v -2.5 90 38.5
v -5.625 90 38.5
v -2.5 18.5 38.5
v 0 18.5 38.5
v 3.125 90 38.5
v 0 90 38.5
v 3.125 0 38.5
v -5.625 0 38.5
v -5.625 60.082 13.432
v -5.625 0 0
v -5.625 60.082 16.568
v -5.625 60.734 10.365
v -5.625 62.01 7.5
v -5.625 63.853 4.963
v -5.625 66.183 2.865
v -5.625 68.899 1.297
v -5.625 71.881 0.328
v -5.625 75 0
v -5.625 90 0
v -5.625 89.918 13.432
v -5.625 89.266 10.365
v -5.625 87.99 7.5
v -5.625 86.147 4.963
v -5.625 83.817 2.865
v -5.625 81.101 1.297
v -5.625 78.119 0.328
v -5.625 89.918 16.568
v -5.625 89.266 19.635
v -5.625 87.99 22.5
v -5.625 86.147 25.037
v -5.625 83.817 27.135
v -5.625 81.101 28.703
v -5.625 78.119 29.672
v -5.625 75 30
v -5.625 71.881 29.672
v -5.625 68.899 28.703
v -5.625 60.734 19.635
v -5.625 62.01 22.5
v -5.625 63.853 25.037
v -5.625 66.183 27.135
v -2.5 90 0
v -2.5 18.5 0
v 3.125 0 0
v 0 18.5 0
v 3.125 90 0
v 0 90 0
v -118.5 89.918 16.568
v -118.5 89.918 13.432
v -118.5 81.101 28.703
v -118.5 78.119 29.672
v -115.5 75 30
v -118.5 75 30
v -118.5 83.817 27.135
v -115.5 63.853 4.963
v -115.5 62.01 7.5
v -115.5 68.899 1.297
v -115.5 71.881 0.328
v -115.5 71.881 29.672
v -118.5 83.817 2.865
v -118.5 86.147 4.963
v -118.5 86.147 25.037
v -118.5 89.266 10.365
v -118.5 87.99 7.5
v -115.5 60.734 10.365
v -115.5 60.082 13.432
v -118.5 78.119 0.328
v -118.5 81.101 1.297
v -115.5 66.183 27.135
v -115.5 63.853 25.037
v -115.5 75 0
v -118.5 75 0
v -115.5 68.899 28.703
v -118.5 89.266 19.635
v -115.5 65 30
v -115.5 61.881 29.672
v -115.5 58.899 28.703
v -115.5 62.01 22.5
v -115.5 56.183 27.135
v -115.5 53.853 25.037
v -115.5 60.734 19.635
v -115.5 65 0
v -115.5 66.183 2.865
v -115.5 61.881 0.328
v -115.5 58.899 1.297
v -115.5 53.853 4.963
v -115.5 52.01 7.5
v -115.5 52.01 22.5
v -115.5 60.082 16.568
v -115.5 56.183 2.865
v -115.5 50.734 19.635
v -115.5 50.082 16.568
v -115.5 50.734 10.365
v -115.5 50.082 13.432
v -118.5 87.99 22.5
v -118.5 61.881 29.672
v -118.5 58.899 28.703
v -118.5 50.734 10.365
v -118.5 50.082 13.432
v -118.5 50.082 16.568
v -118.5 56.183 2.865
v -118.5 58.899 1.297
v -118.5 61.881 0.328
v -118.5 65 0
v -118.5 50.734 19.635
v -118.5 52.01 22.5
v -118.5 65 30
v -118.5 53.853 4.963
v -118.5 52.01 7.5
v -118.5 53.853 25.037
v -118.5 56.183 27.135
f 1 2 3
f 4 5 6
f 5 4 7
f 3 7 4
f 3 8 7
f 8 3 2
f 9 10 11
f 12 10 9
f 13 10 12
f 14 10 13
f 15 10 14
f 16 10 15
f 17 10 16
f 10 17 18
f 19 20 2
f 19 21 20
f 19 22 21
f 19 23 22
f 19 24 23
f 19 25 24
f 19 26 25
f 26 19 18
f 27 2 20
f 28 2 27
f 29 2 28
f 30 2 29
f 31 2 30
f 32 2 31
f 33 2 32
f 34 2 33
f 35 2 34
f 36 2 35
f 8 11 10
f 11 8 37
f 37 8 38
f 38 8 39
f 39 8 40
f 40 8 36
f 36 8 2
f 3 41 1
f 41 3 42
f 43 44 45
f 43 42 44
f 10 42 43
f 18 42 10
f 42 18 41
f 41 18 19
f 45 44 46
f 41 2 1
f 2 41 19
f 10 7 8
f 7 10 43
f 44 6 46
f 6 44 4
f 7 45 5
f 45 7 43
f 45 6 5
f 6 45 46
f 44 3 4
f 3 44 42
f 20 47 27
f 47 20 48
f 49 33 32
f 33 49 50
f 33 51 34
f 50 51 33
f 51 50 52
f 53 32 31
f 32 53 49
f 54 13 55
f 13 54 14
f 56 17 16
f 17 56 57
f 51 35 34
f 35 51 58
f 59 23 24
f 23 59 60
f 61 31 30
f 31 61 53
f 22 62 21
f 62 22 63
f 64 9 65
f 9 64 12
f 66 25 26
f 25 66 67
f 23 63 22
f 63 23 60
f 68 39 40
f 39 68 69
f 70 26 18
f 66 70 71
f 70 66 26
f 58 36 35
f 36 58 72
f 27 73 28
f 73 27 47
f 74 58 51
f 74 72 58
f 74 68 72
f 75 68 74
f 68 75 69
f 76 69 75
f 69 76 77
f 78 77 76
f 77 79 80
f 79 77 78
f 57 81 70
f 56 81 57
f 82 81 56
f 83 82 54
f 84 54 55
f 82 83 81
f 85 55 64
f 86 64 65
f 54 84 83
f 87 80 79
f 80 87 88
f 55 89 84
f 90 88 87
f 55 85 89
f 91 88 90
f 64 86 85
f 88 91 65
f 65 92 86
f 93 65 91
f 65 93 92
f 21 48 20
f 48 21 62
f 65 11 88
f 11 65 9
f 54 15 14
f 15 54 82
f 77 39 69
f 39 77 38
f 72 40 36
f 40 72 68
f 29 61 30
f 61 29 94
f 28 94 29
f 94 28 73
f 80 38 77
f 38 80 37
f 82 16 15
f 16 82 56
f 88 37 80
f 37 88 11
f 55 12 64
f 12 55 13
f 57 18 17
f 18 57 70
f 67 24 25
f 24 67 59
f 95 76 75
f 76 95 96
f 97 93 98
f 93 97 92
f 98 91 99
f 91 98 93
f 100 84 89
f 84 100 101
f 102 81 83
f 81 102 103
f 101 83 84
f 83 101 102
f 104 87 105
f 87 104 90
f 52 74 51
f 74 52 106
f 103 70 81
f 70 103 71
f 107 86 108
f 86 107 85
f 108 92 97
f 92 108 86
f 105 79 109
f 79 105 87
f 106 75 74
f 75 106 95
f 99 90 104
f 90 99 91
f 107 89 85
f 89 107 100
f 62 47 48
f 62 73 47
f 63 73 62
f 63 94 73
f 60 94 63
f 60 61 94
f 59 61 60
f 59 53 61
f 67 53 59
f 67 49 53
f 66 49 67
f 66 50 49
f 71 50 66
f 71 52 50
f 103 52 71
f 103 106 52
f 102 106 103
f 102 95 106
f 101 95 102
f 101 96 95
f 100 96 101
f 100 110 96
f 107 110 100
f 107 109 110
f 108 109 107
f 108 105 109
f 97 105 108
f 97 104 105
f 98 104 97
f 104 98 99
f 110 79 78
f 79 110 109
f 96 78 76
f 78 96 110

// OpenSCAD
/* [Global] */
diameter = 30; // [10:38]
length = 110; //[10:200] 
mini_spool_holder();


module mini_spool_holder()
{
	rotate([0,-90,0])
	{
		union()
		{
			// clip
			translate([0,0,2.5])
			{
				cube([38.5,90,3.125]);
			}
			translate([0,0,-3.125])
			{
				cube([38.5,90,3.125]);
			}
			cube([38.5,18.5,2.5]);

			// axis
			translate([(diameter/2),90-(diameter/2),5.5])
			{
				cylinder(r=diameter/2, h=length);
			}

			// foot
			translate([(diameter/2),90-(diameter/2),length+5.5])
			{
				hull()
				{
					cylinder(r=diameter/2, h=3);
					translate([0,-10,0])
					{
						cylinder(r=diameter/2, h=3);
					}
				}
			}
		}
	}
}
